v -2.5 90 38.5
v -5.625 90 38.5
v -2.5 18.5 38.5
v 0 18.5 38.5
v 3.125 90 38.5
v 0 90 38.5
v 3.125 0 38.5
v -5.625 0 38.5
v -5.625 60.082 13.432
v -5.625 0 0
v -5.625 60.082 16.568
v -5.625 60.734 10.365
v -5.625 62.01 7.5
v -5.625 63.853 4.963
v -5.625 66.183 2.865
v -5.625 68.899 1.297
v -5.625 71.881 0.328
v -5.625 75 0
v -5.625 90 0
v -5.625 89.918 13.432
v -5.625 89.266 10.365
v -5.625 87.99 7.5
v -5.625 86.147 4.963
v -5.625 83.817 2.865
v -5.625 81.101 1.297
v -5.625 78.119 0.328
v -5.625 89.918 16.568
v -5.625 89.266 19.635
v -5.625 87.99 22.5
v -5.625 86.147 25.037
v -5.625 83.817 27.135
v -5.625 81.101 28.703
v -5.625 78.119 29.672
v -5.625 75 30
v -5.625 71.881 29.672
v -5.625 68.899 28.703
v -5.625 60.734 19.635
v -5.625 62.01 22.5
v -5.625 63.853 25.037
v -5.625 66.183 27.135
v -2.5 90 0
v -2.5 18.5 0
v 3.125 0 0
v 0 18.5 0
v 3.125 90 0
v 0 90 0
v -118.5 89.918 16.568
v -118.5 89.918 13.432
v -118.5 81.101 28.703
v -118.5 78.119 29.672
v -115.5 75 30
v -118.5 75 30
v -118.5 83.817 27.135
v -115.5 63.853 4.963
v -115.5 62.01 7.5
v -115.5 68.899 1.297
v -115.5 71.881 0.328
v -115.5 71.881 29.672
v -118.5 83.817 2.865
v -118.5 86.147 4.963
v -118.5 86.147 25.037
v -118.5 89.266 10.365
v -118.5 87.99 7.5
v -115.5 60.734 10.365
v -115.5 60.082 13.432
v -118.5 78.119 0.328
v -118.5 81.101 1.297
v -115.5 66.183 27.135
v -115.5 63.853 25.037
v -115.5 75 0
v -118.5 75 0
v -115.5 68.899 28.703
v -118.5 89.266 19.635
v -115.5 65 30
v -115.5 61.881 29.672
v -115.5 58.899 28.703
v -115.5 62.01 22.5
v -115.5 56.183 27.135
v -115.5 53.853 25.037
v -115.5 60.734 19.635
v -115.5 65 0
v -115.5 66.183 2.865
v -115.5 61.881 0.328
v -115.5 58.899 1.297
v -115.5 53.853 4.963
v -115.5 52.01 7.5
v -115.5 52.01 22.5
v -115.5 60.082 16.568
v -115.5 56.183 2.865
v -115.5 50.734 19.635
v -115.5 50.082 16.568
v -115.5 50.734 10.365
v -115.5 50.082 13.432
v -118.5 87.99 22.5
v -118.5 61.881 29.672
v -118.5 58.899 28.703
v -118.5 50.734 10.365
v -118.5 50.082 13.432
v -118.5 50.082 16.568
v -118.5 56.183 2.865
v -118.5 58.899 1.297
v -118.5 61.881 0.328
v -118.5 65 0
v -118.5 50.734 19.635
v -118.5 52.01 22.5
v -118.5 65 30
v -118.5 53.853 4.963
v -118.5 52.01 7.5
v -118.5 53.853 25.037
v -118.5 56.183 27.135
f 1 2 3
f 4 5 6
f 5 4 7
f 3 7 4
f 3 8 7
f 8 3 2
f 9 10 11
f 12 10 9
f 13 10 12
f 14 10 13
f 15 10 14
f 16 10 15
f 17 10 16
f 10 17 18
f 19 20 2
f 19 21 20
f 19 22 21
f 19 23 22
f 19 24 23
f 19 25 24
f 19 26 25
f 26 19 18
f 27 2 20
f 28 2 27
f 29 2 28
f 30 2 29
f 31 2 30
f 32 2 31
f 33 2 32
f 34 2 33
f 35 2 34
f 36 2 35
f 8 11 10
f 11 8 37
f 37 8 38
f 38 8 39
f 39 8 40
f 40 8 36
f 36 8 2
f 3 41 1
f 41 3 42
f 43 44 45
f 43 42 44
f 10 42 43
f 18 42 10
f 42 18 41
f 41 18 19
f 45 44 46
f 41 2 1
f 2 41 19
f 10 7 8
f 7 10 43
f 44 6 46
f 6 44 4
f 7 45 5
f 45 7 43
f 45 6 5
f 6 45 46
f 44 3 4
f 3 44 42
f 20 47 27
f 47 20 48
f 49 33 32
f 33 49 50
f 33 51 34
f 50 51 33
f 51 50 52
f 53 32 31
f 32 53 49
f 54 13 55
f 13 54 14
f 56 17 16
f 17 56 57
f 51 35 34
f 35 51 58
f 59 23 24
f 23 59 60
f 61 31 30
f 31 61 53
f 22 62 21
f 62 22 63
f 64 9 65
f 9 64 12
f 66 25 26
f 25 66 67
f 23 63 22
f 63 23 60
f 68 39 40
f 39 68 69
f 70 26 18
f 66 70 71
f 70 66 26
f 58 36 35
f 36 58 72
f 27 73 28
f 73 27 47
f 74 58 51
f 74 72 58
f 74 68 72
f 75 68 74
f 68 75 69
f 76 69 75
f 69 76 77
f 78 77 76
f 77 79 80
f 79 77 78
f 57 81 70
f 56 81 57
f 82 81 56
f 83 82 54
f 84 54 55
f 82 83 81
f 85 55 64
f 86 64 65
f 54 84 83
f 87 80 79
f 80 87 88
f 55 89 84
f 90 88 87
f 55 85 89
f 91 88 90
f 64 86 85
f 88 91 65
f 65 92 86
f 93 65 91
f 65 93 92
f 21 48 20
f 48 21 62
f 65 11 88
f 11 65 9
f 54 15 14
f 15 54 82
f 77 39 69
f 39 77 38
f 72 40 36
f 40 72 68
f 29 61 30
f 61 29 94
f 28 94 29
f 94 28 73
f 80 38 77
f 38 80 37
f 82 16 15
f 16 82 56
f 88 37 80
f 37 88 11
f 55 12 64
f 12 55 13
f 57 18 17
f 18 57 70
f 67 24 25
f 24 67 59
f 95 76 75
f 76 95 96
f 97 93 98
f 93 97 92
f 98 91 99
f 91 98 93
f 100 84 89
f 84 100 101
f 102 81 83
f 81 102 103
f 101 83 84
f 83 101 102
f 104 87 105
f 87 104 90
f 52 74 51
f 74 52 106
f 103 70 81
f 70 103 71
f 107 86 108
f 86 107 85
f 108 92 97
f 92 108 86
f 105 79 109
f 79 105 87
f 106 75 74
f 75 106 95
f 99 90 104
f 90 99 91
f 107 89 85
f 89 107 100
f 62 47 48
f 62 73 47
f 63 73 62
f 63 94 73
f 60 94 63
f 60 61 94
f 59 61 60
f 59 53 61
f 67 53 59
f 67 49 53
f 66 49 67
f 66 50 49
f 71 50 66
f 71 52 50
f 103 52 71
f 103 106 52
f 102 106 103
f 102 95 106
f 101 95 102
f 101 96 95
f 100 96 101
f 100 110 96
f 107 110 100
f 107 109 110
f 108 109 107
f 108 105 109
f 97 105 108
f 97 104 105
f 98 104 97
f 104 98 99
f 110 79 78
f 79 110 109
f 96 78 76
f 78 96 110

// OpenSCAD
/* [Global] */
diameter = 30; // [10:38]
length = 110; //[10:200] 
mini_spool_holder();


module mini_spool_holder()
{
	rotate([0,-90,0])
	{
		union()
		{
			// clip
			translate([0,0,2.5])
			{
				cube([38.5,90,3.125]);
			}
			translate([0,0,-3.125])
			{
				cube([38.5,90,3.125]);
			}
			cube([38.5,18.5,2.5]);

			// axis
			translate([(diameter/2),90-(diameter/2),5.5])
			{
				cylinder(r=diameter/2, h=length);
			}

			// foot
			translate([(diameter/2),90-(diameter/2),length+5.5])
			{
				hull()
				{
					cylinder(r=diameter/2, h=3);
					translate([0,-10,0])
					{
						cylinder(r=diameter/2, h=3);
					}
				}
			}
		}
	}
}
